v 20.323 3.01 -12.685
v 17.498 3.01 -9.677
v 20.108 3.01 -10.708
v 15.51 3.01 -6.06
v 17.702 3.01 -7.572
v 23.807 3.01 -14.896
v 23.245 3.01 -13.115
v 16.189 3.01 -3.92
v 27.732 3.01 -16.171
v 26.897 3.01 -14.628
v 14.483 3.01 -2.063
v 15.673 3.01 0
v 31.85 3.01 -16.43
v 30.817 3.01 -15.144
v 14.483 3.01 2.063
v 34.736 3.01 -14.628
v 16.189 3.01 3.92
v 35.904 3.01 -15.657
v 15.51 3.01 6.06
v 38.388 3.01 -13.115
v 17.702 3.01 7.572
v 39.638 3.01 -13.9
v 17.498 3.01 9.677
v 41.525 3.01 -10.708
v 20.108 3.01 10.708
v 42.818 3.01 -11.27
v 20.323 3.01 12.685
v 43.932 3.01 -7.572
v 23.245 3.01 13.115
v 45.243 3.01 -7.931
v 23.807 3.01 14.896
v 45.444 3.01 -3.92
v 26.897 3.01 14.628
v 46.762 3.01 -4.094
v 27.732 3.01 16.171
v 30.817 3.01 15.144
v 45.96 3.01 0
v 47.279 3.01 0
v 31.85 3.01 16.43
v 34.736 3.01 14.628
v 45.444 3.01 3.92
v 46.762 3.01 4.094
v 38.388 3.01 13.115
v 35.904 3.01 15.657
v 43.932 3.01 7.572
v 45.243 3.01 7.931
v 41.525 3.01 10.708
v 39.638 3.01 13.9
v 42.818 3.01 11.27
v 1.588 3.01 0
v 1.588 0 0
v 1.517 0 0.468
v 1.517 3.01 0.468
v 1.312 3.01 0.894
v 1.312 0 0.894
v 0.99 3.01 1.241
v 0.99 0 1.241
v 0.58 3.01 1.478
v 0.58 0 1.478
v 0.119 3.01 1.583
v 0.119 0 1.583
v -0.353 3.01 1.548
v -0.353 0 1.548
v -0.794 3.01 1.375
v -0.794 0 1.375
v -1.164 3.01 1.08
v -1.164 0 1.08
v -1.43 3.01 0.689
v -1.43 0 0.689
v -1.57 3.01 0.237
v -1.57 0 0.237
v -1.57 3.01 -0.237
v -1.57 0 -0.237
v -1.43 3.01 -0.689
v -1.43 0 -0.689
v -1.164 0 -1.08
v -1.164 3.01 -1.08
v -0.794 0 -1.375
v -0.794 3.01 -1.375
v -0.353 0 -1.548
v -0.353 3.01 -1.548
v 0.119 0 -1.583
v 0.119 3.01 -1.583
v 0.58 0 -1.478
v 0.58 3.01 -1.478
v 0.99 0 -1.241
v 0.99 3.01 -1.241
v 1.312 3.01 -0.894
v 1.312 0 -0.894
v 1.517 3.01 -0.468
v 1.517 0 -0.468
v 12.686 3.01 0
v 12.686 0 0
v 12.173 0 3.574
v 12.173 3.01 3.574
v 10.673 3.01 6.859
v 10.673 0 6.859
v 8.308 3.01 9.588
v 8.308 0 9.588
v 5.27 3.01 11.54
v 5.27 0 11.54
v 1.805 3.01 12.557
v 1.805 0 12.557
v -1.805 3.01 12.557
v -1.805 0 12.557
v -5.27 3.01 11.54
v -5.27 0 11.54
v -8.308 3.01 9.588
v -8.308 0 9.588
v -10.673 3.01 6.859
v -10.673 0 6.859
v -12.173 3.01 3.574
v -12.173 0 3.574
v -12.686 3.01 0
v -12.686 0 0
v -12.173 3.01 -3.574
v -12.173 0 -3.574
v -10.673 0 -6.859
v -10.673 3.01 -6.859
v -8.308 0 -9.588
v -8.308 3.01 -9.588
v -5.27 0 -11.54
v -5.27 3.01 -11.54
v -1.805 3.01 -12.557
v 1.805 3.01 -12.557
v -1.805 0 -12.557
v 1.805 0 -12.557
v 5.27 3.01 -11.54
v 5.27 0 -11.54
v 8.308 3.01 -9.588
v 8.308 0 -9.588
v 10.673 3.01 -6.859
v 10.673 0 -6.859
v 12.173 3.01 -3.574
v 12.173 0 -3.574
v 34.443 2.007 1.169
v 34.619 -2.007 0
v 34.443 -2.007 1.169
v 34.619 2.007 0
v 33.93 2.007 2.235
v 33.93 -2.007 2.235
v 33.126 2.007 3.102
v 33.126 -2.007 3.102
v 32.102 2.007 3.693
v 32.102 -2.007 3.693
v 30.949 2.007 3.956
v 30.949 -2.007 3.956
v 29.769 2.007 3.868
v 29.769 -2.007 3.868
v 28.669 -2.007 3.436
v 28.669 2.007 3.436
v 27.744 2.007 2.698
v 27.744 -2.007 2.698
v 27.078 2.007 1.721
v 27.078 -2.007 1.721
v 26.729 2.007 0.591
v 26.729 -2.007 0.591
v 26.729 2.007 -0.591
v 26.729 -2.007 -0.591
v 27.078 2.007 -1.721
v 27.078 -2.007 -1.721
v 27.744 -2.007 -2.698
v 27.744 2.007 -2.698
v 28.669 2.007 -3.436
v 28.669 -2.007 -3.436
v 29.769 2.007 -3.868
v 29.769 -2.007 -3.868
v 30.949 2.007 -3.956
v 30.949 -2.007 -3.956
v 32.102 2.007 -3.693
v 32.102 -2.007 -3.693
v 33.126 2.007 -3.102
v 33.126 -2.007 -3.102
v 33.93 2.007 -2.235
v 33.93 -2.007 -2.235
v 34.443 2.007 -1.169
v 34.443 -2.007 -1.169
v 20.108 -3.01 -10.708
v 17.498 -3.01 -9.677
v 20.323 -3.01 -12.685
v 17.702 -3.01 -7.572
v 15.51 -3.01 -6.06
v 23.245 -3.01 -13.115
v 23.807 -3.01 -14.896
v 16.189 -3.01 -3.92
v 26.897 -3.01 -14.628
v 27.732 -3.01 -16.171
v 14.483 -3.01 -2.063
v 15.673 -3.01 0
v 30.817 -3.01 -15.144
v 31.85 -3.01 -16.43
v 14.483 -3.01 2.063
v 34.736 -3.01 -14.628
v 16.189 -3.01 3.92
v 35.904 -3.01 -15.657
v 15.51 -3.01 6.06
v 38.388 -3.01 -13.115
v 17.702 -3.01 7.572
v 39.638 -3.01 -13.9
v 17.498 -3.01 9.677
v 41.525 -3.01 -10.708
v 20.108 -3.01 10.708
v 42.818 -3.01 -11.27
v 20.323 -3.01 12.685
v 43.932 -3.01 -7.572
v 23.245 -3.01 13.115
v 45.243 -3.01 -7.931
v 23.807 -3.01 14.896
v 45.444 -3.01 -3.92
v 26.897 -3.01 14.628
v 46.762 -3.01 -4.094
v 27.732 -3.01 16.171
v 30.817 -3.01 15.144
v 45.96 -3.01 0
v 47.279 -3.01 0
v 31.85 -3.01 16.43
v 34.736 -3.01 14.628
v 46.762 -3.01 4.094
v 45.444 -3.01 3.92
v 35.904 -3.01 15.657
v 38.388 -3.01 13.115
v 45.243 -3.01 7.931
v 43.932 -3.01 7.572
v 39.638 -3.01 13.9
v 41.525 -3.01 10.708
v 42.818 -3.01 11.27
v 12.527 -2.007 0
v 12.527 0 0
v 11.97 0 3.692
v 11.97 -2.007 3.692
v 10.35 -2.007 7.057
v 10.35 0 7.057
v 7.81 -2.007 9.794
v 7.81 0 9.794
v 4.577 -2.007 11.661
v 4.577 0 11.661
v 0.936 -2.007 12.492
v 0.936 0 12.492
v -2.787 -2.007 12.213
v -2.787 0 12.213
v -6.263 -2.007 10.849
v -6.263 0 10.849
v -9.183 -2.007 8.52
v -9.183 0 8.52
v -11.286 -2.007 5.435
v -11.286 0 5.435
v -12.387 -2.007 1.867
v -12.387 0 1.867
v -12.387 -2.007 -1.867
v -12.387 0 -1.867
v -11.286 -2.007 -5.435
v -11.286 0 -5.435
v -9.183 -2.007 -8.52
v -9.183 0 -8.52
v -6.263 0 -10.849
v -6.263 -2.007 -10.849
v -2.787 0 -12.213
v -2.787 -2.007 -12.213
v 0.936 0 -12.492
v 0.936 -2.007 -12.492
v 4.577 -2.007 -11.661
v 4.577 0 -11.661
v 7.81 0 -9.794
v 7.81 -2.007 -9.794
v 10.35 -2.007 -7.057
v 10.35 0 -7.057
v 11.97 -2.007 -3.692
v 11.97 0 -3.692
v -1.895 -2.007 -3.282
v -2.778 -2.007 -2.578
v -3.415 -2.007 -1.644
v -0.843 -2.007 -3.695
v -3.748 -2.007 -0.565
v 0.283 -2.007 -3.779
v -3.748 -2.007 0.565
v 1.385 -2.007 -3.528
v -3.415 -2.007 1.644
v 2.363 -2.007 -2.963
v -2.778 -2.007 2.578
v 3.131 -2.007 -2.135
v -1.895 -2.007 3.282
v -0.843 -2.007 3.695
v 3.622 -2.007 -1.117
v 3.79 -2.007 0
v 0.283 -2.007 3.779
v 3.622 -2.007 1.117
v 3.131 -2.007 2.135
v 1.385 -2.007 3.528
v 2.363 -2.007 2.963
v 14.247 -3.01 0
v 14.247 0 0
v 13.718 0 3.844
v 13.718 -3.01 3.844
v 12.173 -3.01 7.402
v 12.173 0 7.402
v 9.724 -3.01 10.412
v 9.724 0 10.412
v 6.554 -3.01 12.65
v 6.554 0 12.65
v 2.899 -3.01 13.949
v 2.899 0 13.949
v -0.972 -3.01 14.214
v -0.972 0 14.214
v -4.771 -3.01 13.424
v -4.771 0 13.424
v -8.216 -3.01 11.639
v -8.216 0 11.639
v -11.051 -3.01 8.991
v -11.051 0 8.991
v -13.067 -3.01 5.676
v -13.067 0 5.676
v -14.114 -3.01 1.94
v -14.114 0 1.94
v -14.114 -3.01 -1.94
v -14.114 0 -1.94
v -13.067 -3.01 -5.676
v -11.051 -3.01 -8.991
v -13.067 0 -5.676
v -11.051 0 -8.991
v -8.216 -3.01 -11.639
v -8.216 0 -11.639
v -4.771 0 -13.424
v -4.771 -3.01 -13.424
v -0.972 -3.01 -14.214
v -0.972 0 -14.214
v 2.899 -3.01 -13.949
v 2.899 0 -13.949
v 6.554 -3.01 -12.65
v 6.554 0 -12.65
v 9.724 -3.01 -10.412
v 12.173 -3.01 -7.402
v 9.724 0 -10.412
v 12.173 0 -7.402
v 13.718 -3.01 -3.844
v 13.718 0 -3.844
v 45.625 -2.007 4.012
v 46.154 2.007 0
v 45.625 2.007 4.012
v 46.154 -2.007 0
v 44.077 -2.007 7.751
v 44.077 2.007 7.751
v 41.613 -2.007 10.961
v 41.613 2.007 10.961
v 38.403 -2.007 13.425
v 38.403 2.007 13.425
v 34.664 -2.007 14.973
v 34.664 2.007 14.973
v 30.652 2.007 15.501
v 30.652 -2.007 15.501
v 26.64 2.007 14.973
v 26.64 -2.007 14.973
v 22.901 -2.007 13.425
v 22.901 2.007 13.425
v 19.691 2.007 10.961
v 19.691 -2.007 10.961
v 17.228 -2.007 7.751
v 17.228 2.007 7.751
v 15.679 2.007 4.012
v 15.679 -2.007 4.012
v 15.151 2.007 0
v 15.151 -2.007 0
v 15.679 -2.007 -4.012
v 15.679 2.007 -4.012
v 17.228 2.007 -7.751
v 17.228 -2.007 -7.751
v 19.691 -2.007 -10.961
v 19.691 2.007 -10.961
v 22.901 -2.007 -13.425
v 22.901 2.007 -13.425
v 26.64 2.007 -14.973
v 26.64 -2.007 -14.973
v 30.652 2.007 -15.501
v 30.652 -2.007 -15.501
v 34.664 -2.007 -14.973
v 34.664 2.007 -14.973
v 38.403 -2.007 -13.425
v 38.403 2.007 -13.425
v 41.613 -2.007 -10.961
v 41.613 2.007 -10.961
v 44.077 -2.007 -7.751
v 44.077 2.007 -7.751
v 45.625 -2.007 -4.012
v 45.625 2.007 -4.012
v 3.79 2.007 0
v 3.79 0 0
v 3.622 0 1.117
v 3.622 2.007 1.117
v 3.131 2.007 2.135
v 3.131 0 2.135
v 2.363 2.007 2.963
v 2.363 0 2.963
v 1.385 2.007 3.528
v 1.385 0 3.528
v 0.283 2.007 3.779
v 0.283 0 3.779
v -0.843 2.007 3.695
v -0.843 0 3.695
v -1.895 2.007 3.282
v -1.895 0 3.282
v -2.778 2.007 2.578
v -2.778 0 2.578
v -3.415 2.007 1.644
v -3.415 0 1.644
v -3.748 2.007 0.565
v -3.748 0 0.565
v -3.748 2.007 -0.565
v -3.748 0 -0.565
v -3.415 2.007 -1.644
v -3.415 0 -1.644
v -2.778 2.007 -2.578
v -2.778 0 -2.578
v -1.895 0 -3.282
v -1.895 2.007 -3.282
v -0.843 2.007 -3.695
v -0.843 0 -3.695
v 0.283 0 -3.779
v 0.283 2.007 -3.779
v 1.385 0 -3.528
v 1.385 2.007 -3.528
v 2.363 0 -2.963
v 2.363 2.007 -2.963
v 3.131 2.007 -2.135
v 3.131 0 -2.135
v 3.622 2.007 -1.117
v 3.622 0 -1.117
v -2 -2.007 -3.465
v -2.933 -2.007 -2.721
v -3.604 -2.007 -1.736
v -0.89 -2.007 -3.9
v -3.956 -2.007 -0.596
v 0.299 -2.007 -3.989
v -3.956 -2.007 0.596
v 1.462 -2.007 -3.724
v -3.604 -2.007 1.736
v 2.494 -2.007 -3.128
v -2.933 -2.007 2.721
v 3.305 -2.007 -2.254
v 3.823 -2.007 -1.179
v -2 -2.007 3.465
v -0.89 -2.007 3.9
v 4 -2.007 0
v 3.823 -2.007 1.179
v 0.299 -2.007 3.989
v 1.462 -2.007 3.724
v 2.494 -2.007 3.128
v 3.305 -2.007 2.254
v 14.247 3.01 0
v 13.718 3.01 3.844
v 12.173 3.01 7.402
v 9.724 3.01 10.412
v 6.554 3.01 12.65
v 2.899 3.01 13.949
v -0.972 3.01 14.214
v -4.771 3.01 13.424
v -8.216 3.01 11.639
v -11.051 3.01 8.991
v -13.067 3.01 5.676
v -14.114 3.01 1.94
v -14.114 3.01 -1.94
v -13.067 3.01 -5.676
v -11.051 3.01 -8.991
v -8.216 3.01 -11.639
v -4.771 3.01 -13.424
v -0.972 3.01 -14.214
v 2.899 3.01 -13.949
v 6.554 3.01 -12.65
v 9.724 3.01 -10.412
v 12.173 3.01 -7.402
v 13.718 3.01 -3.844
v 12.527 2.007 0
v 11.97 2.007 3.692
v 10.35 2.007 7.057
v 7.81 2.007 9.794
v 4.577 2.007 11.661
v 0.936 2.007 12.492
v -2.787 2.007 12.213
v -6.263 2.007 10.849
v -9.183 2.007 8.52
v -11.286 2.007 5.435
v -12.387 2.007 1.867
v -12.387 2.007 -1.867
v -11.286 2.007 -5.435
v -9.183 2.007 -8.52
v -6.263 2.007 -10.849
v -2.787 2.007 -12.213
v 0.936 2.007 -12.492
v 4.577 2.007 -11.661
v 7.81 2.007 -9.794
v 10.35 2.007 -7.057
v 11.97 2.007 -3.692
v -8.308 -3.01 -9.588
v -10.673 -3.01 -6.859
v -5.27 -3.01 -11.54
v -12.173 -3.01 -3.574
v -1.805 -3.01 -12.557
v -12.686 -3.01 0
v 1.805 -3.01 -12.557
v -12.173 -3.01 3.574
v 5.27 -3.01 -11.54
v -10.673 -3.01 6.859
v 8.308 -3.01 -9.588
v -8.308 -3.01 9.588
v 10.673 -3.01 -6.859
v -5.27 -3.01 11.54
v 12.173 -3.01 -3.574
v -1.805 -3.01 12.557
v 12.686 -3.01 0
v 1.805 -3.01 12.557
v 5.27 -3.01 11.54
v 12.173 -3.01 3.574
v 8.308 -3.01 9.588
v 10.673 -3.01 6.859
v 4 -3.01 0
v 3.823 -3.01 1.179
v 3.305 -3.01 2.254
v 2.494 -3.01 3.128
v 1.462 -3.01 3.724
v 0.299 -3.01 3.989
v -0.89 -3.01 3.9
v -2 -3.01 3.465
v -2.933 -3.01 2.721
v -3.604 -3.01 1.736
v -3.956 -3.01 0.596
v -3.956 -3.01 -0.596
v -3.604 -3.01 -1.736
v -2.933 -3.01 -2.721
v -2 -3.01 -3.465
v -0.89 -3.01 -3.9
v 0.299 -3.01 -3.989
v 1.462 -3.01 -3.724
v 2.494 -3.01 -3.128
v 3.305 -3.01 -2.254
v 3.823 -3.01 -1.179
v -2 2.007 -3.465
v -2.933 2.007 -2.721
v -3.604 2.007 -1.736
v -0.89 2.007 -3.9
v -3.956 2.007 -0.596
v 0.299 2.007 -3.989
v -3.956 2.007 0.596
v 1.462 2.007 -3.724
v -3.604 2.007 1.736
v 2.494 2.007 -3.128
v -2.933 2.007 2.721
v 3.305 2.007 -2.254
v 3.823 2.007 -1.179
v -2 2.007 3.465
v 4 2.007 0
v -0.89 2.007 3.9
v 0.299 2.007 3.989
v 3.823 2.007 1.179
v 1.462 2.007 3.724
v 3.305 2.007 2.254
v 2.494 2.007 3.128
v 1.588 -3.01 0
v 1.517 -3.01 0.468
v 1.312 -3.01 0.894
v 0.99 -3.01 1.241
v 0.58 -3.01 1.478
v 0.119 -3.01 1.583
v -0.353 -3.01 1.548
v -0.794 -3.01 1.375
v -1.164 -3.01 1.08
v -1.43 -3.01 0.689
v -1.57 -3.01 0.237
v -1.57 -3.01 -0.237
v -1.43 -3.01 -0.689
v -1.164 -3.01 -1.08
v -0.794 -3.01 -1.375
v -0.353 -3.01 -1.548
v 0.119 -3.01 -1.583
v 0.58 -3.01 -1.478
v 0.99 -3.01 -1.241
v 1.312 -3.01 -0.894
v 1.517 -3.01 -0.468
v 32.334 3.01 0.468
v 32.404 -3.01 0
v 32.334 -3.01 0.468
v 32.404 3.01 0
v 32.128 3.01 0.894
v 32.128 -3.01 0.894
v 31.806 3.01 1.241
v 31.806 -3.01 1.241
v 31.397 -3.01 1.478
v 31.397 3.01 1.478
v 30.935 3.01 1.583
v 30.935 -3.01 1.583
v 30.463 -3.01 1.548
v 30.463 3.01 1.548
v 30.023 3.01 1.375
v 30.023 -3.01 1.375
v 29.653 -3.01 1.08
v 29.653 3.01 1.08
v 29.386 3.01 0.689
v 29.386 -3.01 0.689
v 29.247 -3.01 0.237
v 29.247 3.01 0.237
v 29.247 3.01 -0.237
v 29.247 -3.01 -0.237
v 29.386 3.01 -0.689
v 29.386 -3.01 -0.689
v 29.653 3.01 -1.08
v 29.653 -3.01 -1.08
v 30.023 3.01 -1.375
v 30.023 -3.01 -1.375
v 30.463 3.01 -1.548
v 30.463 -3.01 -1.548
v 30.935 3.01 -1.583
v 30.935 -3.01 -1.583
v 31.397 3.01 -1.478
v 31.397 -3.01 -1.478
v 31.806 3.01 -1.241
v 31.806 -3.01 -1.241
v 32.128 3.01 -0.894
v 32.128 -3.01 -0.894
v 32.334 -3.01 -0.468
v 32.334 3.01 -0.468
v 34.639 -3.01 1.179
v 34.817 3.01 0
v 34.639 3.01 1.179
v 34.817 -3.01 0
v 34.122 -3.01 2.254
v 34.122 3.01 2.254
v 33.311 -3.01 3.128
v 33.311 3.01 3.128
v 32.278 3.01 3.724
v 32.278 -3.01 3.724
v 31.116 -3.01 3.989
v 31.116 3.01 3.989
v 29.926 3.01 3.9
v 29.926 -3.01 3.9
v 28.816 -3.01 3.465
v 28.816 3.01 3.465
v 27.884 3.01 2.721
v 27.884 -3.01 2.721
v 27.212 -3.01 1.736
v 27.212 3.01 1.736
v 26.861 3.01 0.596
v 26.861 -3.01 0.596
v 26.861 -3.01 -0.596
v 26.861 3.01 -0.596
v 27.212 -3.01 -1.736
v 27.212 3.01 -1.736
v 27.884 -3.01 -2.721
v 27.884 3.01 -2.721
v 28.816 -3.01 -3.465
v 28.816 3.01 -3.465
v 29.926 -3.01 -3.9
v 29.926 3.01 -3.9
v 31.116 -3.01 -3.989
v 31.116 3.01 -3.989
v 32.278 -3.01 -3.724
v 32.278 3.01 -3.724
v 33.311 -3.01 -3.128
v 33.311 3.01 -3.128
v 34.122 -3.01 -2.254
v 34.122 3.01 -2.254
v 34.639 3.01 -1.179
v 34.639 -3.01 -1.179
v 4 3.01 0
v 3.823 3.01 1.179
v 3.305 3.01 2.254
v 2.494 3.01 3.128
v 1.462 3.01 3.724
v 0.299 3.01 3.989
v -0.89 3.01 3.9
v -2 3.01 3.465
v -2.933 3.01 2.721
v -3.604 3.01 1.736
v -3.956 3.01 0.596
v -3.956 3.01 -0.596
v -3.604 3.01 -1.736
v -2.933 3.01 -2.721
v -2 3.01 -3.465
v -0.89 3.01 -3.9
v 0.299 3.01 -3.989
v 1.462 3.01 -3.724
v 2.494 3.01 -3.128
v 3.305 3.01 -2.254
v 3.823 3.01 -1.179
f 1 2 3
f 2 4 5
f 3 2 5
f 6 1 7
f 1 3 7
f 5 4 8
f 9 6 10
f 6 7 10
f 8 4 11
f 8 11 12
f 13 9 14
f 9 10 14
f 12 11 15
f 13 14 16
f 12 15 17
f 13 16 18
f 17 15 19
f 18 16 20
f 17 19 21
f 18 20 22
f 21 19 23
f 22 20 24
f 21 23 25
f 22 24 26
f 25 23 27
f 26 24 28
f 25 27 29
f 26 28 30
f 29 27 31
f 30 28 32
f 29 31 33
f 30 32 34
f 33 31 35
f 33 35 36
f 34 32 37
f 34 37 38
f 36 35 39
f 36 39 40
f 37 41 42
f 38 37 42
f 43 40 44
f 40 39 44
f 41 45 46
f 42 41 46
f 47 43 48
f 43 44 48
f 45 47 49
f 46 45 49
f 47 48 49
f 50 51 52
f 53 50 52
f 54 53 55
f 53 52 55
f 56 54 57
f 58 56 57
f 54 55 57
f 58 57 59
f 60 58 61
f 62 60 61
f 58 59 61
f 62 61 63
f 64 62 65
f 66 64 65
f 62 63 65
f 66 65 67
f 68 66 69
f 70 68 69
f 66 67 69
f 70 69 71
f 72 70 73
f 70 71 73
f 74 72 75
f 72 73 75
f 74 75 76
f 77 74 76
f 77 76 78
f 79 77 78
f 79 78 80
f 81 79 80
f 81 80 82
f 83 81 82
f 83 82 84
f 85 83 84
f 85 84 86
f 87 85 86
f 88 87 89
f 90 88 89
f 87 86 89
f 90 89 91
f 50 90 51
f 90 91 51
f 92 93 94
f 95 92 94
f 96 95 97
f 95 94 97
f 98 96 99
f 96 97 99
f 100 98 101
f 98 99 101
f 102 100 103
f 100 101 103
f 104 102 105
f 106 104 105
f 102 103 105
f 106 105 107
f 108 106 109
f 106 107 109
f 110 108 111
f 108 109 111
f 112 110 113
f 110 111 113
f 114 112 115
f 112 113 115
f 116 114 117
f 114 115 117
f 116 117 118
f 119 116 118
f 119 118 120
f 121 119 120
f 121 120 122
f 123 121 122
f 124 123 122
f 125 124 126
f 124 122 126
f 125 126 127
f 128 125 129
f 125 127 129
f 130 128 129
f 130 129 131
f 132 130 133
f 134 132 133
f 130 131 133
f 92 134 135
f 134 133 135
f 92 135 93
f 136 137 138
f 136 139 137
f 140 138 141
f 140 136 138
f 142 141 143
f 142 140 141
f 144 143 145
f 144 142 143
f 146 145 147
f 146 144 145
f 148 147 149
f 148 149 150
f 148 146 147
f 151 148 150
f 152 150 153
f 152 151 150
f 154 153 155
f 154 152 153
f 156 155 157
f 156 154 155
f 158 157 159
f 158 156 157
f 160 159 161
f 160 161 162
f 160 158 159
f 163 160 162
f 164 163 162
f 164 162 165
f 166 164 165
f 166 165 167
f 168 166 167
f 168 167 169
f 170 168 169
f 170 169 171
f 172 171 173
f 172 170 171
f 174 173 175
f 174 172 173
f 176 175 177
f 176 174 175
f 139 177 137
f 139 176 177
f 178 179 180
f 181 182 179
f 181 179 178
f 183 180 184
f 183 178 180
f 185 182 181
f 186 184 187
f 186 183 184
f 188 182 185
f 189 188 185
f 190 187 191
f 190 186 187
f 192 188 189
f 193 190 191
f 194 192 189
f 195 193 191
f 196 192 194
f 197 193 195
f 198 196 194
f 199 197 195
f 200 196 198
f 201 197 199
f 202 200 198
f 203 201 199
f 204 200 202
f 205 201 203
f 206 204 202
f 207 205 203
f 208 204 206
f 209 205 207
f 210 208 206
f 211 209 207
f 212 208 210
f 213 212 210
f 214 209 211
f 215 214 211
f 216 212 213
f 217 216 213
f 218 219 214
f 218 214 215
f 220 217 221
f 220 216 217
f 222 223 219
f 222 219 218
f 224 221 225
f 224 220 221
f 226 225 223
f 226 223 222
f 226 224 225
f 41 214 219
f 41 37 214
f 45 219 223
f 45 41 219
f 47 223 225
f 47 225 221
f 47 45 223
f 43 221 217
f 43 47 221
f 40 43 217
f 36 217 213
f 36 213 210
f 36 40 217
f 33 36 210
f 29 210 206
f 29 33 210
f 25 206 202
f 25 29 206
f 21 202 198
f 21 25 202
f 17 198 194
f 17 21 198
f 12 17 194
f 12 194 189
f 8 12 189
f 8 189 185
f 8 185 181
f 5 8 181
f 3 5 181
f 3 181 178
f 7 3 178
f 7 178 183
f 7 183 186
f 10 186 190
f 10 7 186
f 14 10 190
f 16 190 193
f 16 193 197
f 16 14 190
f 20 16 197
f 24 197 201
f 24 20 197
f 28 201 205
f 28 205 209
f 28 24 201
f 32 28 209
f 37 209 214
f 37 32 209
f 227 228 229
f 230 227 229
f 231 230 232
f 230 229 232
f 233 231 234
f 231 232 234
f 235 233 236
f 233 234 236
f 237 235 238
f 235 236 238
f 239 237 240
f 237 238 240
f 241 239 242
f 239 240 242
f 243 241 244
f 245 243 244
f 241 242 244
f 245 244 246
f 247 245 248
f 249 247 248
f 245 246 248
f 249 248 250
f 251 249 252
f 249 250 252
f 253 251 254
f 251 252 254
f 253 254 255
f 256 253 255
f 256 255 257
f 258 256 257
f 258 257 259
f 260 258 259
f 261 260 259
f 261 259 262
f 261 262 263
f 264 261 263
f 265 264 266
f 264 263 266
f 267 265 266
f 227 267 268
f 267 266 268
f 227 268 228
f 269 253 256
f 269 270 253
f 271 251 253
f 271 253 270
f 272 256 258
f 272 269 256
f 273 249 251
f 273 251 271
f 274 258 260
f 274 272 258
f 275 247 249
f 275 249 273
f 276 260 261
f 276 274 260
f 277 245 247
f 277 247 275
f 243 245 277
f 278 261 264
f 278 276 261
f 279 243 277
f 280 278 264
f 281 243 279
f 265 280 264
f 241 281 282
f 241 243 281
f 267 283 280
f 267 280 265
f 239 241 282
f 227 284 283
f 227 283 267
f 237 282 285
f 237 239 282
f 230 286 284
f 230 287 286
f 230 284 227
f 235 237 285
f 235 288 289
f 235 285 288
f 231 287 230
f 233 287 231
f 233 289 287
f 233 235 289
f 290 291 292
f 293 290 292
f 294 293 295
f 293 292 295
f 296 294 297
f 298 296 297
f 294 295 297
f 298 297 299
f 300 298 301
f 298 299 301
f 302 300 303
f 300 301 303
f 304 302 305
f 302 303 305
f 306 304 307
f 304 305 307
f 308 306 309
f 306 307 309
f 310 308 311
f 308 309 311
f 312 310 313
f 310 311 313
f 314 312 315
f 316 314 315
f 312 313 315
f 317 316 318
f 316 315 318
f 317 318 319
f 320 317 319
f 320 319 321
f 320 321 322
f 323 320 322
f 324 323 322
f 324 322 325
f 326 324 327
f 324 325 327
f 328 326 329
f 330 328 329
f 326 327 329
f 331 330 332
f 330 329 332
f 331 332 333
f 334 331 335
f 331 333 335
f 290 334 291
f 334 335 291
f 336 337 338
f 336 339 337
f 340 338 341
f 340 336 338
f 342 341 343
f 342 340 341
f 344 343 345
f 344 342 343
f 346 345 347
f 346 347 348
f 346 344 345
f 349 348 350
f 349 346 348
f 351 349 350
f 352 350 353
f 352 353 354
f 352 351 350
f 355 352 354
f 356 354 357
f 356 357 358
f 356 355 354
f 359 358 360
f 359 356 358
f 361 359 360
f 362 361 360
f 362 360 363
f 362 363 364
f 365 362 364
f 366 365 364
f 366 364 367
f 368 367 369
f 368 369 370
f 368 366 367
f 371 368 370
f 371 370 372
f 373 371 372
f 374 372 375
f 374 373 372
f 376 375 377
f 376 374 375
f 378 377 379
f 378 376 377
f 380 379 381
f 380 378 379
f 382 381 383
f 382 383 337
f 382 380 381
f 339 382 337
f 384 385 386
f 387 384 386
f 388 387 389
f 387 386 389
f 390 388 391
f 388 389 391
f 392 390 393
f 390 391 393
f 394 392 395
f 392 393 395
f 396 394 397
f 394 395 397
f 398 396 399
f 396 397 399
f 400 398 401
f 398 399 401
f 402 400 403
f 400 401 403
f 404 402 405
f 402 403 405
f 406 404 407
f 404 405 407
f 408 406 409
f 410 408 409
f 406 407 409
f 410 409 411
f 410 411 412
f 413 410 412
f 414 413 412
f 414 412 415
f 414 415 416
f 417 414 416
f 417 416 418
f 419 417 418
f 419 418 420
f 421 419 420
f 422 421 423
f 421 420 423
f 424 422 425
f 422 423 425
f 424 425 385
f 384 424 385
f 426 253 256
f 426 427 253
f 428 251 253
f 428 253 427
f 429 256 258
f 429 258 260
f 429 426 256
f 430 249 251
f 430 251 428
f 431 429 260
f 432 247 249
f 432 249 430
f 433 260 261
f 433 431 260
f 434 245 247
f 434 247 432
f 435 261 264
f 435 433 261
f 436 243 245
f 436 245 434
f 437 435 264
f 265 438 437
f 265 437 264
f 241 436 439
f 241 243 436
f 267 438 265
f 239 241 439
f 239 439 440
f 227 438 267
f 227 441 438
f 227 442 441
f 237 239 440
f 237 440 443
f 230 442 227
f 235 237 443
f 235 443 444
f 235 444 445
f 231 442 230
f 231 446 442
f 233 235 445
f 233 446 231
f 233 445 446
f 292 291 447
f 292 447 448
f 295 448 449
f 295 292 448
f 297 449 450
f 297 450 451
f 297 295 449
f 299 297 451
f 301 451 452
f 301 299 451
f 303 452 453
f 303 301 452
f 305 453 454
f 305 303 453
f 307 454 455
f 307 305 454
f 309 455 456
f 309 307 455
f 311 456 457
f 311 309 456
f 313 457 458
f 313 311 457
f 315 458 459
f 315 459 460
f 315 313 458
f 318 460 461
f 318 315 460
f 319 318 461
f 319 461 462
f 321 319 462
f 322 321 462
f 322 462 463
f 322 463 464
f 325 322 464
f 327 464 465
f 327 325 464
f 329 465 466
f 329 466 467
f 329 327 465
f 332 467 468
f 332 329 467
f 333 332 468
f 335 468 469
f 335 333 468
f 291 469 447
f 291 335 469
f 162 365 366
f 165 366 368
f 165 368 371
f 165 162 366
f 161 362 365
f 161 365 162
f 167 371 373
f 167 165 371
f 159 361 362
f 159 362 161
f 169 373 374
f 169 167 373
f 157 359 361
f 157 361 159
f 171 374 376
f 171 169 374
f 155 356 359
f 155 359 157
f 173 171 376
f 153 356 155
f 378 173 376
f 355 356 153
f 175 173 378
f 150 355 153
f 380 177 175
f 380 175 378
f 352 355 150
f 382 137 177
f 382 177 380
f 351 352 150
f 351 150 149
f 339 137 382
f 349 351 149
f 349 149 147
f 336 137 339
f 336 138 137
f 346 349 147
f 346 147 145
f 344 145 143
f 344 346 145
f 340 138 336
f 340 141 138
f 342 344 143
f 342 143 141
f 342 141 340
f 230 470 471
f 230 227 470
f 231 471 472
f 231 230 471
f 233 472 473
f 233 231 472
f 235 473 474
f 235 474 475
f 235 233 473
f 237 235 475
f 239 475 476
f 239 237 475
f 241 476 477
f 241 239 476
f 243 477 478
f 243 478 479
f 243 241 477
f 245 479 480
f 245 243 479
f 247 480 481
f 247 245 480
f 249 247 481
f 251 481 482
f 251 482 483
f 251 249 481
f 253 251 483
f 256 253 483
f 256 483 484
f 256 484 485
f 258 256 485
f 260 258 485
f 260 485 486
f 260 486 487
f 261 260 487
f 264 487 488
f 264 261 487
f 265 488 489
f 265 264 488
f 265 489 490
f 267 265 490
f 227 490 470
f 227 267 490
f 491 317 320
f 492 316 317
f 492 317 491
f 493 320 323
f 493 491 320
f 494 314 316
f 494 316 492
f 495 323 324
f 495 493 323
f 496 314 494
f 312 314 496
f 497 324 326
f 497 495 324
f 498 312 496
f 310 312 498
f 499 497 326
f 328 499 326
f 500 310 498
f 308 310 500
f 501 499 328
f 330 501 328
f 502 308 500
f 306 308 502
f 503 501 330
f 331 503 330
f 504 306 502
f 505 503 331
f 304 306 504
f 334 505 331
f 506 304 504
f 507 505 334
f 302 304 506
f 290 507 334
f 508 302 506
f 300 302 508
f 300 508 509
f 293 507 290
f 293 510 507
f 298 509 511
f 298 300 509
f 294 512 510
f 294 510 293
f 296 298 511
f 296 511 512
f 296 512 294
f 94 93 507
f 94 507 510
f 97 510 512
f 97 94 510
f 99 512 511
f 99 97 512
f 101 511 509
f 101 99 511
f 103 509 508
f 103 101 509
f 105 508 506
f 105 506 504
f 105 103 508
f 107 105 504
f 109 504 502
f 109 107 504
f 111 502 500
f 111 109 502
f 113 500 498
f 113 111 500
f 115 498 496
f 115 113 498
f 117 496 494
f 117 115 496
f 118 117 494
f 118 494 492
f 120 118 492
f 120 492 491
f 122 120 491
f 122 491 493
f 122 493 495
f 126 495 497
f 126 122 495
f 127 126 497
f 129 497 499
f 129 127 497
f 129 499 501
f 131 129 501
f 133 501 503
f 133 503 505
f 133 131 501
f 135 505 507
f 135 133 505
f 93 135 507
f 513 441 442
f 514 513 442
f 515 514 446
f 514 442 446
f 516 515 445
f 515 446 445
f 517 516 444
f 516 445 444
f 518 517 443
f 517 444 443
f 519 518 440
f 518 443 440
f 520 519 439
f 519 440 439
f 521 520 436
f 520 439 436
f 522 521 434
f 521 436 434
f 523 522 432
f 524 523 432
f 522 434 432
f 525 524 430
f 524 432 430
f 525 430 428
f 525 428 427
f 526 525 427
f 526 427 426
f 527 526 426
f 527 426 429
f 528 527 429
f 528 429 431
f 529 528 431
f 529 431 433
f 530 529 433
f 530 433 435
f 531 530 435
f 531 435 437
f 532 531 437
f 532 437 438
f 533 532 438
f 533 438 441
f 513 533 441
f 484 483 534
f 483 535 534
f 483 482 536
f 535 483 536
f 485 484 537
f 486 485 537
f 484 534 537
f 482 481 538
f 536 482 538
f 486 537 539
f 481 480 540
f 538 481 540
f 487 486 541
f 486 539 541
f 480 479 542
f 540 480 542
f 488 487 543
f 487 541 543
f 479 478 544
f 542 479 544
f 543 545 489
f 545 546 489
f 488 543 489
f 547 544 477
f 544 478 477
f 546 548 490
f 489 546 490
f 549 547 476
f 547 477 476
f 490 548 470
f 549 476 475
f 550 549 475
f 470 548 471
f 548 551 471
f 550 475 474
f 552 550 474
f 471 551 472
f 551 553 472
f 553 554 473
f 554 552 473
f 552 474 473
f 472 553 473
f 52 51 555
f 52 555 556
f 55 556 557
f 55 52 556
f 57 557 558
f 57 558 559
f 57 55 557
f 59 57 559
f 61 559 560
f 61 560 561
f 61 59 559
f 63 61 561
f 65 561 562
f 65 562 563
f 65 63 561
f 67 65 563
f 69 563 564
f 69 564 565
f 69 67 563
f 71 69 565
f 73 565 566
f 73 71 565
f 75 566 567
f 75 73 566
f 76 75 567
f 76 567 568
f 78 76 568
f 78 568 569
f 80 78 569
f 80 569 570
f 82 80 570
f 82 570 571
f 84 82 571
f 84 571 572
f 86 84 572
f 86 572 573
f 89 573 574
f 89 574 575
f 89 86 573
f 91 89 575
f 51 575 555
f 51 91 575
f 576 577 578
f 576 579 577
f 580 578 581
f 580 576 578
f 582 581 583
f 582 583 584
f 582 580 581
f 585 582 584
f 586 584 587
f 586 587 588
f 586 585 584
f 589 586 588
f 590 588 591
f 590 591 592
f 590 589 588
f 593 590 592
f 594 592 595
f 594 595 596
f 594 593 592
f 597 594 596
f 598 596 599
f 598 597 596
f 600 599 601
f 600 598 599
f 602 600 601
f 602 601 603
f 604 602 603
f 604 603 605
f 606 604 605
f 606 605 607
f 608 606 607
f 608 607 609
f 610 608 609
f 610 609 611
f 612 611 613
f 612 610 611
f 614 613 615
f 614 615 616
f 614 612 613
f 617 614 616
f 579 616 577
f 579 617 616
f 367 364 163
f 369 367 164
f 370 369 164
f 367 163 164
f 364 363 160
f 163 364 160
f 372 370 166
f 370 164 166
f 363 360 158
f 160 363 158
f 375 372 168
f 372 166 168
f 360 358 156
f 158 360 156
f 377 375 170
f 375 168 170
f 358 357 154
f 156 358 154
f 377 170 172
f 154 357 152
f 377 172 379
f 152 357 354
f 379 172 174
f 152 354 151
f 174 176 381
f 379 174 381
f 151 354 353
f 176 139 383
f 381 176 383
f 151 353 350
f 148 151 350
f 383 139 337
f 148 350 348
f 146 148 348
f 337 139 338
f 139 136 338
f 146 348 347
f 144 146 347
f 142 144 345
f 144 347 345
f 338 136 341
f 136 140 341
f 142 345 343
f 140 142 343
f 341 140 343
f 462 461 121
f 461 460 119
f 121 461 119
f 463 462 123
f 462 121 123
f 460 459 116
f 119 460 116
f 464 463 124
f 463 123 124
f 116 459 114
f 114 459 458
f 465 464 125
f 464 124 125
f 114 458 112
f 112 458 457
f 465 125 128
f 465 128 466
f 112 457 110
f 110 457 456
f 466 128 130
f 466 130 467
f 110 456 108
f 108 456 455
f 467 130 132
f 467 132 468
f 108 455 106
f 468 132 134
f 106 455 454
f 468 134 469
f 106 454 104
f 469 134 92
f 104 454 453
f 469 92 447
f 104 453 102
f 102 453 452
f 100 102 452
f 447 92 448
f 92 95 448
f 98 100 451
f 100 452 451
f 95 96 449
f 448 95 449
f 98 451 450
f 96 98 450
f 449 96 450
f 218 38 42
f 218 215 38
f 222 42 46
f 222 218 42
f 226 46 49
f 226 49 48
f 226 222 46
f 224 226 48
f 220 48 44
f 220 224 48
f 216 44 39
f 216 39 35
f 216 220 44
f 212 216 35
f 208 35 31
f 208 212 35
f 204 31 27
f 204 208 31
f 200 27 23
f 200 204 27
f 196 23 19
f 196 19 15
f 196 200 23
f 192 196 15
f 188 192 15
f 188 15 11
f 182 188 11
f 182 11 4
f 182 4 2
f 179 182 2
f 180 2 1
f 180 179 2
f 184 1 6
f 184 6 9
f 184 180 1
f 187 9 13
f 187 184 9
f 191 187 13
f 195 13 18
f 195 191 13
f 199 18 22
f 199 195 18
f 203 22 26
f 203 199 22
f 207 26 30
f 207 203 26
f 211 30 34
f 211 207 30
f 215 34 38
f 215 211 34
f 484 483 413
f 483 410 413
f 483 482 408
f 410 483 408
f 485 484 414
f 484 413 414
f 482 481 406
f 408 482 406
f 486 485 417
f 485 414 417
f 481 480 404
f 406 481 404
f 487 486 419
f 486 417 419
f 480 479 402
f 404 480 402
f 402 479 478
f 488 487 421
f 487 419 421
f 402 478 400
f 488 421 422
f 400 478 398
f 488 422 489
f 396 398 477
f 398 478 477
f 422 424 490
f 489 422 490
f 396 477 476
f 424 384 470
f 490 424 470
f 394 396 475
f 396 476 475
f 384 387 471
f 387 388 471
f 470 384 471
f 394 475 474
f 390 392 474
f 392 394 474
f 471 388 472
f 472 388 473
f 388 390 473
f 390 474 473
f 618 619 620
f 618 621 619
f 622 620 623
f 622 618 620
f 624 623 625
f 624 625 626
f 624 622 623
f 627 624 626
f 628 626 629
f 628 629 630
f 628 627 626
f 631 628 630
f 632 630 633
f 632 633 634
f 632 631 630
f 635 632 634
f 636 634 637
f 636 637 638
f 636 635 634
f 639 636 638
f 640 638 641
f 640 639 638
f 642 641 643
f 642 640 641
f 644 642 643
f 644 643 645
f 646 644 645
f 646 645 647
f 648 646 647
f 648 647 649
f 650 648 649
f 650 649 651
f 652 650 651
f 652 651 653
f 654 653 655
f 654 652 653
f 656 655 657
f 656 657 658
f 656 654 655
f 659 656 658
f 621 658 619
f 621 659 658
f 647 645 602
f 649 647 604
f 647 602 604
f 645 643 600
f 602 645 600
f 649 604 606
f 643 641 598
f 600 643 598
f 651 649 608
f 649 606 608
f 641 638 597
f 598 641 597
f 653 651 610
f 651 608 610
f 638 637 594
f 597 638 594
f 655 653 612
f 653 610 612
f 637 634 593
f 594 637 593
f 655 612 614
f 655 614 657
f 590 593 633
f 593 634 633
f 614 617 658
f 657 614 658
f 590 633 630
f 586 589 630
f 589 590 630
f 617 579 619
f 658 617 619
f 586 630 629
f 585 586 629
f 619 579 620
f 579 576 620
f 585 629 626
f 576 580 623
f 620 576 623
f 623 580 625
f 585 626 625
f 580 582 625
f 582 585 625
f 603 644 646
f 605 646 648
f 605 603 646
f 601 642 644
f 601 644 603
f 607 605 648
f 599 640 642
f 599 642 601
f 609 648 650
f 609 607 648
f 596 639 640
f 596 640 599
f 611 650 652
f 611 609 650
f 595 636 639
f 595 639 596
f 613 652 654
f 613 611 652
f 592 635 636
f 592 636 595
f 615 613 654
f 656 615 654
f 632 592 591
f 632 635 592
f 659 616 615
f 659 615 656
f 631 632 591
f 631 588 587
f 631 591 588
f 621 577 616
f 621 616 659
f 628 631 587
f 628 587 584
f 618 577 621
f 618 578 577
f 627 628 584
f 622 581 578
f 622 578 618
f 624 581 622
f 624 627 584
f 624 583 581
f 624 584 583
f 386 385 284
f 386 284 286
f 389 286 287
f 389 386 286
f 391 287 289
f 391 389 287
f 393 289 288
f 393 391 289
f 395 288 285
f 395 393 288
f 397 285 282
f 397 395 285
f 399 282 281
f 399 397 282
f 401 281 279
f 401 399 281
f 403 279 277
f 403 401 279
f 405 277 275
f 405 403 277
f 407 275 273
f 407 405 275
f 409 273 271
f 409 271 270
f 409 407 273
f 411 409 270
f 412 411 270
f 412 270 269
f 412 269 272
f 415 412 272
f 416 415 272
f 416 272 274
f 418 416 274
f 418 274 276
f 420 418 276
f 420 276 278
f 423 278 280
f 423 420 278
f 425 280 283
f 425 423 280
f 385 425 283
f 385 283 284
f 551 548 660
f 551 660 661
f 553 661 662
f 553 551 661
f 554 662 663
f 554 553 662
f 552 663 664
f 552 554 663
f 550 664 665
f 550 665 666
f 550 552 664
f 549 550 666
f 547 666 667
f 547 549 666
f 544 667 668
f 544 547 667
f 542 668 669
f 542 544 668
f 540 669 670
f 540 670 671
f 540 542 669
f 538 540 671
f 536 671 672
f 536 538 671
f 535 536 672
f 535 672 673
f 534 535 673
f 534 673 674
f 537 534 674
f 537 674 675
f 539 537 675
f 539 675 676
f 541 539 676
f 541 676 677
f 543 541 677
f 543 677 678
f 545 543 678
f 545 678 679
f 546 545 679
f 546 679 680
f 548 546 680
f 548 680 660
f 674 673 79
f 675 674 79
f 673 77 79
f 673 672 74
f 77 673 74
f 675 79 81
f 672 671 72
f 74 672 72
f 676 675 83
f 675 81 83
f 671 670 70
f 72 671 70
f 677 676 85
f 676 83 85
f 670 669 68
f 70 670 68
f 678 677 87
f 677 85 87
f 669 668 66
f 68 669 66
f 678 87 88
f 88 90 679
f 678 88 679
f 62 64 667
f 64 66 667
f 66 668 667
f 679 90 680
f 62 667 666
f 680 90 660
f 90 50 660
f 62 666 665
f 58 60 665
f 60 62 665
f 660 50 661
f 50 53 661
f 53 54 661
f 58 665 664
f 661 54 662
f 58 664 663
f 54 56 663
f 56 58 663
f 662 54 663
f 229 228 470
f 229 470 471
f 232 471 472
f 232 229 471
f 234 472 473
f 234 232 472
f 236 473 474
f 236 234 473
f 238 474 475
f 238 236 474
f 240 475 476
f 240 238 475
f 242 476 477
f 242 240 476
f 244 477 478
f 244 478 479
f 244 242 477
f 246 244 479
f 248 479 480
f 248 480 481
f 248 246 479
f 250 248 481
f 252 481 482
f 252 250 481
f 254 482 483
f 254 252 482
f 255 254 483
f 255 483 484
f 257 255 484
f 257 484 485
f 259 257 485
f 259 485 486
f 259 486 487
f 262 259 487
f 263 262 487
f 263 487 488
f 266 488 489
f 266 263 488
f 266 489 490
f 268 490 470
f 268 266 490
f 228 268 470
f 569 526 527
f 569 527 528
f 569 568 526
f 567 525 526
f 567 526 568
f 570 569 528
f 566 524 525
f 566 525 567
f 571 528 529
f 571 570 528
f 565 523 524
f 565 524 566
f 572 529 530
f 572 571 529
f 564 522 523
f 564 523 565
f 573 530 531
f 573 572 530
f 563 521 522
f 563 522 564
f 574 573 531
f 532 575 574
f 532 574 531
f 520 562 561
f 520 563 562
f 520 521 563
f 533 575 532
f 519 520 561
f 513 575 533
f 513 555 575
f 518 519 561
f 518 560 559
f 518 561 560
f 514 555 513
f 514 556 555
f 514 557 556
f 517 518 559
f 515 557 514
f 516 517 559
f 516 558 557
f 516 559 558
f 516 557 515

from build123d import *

# Parameters (mm, degrees)
F0_R     = 4.0005
F0_R_2   = 1.5875
F1_DEPTH = 3.0099
F0_R_3   = 14.246784
F0_R_4   = 12.686449
F0_R_5   = 16.462893
F0_R_6   = 15.143819
F2_DEPTH = 3.0099
F3_R     = 12.526784
F3_R_2   = 3.789965
F4_DEPTH = 2.0066
F3_R_3   = 15.501415
F3_R_4   = 3.967314
F5_DEPTH = 2.0066


with BuildPart() as f1:
    # F0 (on Front) → F1 (new body, symmetric)
    with BuildSketch(Plane.XZ):
        Circle(F0_R)
        Circle(F0_R_2, mode=Mode.SUBTRACT)
        with Locations((30.816578, 0)):
            Circle(F0_R)
        with Locations((30.816578, 0)):
            Circle(F0_R_2, mode=Mode.SUBTRACT)
    extrude(amount=F1_DEPTH, both=True)

    # F3 (on Front) → F4 (join, symmetric)
    with BuildSketch(Plane.XZ):
        Circle(F3_R)
        Circle(F3_R_2, mode=Mode.SUBTRACT)
    extrude(amount=F4_DEPTH, both=True)


with BuildPart() as f2:
    # F0 (on Front) → F2 (new body, symmetric)
    with BuildSketch(Plane.XZ):
        Circle(F0_R_3)
        Circle(F0_R_4, mode=Mode.SUBTRACT)
        with Locations((30.816578, 0)):
            Circle(F0_R_5)
        with Locations((30.816578, 0)):
            Circle(F0_R_6, mode=Mode.SUBTRACT)
    extrude(amount=F2_DEPTH, both=True)


with BuildPart() as f5:
    # F3 (on Front) → F5 (new body, symmetric)
    with BuildSketch(Plane.XZ):
        Circle(F3_R)
        Circle(F3_R_2, mode=Mode.SUBTRACT)
        with Locations((30.652158, 0)):
            Circle(F3_R_3)
        with Locations((30.652158, 0)):
            Circle(F3_R_4, mode=Mode.SUBTRACT)
    extrude(amount=F5_DEPTH, both=True)


solid = Compound([f1.part, f2.part, f5.part])
